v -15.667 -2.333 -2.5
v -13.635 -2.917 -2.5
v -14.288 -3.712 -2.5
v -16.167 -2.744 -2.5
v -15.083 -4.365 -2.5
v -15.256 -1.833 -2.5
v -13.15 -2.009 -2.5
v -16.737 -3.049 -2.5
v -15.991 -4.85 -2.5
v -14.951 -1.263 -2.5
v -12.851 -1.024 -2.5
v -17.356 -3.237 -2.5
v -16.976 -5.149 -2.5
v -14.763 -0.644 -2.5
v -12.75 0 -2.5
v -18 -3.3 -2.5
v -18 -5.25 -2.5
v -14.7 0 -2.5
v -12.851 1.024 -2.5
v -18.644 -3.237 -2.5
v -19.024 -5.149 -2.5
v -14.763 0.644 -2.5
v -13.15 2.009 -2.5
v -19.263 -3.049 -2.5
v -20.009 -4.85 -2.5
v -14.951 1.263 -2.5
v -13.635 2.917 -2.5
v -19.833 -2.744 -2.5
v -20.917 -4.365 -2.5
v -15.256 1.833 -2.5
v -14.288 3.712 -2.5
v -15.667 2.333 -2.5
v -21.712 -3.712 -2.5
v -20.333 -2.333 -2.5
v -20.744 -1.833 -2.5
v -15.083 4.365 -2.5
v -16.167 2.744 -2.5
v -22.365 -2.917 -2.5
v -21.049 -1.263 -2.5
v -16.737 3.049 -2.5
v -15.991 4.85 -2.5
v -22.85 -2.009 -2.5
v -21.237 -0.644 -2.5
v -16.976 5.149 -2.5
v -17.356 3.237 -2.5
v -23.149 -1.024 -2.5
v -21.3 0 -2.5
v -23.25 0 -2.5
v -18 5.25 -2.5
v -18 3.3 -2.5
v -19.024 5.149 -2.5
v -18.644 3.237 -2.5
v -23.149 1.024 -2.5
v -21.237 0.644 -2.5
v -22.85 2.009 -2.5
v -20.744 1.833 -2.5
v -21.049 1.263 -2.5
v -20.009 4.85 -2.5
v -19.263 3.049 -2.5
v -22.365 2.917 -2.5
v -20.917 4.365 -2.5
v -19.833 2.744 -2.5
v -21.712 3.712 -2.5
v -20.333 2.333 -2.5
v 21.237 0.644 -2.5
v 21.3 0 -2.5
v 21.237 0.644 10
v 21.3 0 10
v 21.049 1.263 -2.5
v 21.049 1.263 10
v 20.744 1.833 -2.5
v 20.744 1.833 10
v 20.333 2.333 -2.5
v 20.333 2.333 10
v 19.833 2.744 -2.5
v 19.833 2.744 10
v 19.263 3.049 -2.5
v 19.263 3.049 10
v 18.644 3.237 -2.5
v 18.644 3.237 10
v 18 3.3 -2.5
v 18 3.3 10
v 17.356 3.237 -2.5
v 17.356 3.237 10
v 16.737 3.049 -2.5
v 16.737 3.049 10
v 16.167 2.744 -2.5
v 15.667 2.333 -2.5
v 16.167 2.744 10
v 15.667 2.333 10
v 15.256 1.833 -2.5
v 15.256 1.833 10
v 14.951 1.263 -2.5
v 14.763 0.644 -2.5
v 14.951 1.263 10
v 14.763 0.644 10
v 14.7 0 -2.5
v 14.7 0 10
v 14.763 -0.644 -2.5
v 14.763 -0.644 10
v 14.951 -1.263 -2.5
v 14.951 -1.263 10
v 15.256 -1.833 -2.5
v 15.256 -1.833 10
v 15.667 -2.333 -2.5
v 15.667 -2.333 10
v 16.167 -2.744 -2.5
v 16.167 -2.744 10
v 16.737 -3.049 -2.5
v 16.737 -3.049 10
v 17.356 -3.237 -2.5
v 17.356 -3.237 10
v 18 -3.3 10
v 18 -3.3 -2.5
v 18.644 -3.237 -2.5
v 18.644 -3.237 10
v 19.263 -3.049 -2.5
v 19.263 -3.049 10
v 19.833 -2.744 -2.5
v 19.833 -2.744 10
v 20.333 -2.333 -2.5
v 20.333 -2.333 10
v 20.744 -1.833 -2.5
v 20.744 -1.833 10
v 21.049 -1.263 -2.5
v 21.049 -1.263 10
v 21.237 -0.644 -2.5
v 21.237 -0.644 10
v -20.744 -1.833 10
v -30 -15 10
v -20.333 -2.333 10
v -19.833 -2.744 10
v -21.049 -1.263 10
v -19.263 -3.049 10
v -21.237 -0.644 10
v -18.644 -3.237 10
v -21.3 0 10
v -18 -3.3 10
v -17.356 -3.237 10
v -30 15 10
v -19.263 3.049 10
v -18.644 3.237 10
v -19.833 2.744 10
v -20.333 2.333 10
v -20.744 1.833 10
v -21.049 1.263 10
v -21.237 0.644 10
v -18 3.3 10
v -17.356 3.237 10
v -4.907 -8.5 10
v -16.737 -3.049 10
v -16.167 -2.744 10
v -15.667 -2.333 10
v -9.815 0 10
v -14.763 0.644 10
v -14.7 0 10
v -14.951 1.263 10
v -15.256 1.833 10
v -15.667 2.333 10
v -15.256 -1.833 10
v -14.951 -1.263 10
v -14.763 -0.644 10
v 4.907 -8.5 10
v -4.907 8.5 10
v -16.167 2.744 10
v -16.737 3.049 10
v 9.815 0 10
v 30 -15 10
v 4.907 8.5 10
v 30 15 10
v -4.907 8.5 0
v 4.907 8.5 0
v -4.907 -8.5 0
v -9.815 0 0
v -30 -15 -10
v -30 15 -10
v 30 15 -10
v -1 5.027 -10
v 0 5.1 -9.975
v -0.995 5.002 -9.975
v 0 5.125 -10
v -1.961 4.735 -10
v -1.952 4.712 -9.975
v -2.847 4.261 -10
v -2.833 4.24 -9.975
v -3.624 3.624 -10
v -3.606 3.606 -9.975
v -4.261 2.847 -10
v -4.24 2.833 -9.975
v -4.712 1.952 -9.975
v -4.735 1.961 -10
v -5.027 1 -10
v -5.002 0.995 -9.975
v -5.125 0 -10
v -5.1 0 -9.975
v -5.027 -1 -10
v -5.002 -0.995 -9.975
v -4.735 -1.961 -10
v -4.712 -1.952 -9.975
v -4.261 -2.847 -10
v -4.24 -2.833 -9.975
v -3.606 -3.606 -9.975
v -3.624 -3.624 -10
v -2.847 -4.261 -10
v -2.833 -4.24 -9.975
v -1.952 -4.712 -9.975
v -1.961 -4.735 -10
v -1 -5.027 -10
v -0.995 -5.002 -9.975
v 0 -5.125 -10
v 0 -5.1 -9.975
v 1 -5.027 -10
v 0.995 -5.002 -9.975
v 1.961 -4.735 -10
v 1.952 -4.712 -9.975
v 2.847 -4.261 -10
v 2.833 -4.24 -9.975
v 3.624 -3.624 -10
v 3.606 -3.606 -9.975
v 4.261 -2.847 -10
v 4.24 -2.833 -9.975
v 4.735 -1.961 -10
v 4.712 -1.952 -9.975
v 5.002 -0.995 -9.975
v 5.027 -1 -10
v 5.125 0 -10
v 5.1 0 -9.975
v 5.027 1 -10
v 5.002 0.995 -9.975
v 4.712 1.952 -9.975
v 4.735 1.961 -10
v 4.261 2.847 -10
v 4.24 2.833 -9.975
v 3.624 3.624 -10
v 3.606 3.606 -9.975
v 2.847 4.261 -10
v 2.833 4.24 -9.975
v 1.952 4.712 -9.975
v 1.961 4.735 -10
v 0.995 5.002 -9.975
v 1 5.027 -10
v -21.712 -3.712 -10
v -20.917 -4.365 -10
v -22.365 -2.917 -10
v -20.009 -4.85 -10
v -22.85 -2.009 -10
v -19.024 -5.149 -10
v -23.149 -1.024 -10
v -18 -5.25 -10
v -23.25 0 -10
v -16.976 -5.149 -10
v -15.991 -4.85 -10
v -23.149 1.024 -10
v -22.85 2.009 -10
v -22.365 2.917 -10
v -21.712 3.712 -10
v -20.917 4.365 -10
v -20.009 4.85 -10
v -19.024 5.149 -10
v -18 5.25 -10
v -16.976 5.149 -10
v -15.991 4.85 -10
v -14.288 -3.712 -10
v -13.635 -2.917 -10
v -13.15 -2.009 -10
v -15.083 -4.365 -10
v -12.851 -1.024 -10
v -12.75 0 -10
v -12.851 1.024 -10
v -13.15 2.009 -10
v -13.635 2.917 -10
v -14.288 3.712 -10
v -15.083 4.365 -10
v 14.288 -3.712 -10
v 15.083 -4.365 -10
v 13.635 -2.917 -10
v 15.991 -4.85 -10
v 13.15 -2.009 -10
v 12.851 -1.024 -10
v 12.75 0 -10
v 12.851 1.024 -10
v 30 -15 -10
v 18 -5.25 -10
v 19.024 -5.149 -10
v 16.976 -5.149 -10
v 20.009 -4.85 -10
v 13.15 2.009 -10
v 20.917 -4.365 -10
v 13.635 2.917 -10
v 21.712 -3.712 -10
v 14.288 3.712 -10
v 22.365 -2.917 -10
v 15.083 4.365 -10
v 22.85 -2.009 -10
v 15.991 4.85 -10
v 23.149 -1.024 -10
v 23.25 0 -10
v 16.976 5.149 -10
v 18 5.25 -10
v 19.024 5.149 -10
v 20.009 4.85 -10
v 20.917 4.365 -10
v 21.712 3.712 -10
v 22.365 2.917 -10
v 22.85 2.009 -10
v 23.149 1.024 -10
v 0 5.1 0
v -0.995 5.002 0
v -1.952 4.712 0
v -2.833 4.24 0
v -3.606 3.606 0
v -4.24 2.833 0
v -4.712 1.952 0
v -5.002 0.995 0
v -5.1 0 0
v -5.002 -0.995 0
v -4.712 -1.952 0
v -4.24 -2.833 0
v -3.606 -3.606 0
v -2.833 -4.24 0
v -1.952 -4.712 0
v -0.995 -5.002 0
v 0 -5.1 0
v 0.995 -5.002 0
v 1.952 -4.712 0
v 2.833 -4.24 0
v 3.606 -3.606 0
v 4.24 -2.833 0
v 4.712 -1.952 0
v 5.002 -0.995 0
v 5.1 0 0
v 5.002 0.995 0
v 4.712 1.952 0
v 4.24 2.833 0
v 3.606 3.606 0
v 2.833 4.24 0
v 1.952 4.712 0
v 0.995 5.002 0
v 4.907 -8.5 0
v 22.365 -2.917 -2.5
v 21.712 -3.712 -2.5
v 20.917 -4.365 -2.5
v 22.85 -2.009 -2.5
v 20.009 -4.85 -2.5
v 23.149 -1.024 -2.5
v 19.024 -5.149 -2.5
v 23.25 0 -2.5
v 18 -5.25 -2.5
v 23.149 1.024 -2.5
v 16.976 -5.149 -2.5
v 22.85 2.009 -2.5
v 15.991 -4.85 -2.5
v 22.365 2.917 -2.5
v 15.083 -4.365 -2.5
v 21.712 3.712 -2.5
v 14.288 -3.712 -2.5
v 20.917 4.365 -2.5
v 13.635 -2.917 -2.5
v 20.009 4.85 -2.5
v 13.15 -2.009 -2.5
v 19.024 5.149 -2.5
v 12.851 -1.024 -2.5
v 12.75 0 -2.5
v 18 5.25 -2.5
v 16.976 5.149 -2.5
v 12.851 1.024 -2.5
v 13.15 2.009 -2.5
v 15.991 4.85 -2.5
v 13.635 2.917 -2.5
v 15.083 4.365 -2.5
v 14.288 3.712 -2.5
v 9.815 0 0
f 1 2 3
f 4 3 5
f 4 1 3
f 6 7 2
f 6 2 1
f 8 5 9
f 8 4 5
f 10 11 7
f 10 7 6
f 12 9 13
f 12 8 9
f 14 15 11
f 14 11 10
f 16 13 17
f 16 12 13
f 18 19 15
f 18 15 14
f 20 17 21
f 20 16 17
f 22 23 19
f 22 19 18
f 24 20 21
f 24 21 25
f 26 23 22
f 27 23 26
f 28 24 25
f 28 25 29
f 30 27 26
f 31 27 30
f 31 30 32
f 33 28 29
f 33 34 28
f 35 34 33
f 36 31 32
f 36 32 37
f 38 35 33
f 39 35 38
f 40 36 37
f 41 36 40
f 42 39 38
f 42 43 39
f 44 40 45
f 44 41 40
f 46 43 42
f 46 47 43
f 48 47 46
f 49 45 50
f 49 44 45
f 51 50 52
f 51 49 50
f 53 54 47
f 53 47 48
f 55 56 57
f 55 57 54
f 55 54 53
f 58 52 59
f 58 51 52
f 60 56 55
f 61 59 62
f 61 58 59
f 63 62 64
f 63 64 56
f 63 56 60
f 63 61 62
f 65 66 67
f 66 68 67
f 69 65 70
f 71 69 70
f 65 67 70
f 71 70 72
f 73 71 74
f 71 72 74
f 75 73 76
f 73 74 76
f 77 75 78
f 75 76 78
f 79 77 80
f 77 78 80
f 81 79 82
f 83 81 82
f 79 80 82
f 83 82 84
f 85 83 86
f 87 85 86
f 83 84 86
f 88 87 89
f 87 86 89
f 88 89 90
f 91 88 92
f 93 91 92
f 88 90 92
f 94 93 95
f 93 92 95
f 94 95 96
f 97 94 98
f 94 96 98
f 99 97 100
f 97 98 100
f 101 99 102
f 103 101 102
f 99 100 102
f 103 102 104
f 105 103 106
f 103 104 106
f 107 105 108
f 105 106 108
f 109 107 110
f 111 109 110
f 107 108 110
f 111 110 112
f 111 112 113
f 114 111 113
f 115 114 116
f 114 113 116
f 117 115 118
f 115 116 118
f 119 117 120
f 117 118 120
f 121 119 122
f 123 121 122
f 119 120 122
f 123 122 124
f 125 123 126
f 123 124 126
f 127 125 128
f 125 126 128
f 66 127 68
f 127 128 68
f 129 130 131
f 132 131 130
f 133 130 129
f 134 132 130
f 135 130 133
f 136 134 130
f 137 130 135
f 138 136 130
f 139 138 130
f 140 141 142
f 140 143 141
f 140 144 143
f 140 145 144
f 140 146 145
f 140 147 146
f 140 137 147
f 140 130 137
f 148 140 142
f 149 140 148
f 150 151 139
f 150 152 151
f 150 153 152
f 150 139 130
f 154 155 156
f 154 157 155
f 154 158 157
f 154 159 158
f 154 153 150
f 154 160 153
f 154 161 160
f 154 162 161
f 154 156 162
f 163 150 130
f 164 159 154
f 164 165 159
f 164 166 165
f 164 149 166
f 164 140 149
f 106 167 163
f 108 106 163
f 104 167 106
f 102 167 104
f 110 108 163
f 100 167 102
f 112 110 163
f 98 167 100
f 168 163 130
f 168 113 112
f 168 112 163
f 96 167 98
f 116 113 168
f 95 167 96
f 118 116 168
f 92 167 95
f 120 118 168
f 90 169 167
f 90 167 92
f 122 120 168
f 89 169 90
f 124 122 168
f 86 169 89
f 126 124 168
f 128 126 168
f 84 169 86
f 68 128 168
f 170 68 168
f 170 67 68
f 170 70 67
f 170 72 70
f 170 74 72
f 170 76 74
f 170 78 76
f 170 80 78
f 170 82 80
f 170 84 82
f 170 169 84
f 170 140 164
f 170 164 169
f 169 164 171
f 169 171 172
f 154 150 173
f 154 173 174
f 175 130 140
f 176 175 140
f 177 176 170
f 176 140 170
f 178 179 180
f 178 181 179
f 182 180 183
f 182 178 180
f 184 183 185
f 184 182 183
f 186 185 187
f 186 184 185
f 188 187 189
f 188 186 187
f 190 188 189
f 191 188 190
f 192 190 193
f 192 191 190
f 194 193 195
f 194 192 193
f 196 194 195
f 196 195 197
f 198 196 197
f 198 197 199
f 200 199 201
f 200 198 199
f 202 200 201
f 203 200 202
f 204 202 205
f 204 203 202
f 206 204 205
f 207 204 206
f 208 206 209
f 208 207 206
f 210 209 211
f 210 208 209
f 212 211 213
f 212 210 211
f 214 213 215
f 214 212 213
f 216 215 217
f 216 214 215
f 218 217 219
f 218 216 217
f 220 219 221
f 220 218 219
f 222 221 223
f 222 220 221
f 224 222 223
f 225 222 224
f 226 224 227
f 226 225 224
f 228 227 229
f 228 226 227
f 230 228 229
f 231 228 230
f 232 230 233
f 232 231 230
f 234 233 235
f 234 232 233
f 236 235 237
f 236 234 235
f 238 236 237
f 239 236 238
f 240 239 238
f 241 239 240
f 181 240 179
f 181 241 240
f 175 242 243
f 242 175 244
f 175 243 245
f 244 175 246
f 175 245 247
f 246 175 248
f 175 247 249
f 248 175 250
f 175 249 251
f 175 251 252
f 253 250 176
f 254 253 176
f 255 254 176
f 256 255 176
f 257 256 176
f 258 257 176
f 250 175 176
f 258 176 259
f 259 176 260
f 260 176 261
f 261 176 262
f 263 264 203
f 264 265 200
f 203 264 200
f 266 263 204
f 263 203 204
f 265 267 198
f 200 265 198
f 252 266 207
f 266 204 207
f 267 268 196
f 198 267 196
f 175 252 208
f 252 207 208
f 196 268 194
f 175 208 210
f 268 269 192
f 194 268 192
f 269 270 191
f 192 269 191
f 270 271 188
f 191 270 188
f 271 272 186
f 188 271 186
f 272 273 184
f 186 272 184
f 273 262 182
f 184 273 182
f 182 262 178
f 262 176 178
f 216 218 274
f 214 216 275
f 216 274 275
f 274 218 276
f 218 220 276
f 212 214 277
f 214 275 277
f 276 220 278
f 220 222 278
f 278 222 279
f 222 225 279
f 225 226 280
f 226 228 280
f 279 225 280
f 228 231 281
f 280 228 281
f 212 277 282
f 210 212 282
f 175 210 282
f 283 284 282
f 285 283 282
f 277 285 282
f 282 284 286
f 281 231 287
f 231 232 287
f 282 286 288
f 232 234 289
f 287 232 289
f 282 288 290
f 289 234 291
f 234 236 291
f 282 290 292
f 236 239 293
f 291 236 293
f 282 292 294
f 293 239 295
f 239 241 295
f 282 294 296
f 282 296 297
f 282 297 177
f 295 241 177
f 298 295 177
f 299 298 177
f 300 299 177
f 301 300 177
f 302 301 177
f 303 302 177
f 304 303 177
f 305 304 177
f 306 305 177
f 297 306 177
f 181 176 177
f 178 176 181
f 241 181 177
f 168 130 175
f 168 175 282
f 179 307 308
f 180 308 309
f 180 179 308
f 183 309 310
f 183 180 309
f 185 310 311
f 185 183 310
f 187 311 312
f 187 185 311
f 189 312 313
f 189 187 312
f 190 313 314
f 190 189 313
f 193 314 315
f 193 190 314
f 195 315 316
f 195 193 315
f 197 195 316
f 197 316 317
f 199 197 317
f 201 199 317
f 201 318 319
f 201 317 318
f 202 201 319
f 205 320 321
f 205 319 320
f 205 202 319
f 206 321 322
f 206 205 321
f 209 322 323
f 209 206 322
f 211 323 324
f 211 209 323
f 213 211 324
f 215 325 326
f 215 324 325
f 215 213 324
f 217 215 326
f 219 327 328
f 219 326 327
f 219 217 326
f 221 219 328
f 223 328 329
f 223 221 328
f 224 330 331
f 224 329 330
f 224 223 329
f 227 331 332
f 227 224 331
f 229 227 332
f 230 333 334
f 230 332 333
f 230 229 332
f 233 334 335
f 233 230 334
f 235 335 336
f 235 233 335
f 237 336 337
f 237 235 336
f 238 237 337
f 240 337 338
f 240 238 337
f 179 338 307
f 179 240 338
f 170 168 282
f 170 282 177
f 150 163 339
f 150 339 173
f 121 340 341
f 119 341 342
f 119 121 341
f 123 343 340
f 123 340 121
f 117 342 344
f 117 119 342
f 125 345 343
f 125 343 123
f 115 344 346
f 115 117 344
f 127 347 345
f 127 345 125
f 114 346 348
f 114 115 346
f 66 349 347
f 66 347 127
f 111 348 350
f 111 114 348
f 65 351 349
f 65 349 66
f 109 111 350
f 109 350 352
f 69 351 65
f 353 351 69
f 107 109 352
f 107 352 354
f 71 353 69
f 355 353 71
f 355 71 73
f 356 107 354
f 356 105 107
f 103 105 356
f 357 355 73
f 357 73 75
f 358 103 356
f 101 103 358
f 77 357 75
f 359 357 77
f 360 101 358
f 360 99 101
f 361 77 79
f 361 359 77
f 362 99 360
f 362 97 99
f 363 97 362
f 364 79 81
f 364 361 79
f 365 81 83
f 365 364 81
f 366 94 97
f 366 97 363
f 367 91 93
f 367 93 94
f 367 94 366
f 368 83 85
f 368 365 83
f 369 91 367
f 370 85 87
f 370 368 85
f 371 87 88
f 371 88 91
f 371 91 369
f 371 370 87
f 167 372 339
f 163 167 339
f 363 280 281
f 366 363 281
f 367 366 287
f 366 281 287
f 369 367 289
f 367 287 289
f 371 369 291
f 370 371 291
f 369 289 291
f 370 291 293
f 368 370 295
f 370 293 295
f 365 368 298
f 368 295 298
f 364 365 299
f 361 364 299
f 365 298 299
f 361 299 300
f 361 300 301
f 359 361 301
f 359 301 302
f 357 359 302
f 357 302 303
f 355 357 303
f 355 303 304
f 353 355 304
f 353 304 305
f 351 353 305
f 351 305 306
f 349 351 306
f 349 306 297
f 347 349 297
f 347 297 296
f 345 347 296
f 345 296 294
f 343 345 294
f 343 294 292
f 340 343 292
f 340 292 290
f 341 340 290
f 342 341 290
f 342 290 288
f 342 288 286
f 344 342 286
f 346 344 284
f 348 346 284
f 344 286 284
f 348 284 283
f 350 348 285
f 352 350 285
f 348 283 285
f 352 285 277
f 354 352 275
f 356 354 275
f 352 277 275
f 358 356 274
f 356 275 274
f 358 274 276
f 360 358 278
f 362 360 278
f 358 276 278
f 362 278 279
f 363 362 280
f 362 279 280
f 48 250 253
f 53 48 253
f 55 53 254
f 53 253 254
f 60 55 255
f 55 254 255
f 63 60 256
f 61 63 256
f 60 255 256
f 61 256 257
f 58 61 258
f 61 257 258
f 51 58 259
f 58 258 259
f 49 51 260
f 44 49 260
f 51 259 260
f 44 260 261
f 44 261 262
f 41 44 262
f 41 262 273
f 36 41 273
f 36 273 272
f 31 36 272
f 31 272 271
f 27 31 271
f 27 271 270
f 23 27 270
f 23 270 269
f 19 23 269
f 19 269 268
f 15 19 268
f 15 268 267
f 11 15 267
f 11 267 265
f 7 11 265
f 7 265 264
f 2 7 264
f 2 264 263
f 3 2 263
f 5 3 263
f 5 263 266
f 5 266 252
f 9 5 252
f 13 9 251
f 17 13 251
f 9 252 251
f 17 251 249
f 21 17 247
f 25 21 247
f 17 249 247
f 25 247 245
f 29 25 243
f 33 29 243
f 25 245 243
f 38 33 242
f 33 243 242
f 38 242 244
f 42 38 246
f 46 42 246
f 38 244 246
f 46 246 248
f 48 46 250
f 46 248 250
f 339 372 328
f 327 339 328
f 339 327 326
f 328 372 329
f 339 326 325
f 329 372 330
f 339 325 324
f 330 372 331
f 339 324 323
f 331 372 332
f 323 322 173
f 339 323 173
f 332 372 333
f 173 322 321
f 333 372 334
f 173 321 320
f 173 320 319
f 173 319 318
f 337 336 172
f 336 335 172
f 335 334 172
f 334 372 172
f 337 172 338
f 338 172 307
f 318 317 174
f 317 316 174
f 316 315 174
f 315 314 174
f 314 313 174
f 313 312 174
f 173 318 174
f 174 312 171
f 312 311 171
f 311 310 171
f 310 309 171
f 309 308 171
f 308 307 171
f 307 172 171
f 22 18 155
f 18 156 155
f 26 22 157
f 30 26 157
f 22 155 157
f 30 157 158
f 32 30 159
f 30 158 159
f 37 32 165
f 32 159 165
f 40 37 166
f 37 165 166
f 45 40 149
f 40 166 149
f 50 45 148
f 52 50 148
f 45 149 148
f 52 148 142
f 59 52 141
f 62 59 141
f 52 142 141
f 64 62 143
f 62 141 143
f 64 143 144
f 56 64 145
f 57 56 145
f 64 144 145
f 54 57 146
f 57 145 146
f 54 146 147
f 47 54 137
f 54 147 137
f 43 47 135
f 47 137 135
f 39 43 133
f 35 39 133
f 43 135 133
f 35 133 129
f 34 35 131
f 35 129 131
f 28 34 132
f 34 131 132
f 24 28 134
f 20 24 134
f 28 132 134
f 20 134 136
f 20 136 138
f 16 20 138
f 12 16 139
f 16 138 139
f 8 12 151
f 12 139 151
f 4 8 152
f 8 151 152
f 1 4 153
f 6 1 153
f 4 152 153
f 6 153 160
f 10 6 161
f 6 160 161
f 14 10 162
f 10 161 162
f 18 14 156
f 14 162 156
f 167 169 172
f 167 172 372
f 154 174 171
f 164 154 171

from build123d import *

# Parameters (mm, degrees)
SKETCH3_W                                    = 60
SKETCH3_H                                    = 30
BOSS_EXTRUDE1_DEPTH                          = 10
CBORE_FOR_M6_HEX_HEAD_CAP_SCREW1_D           = 6.6
CBORE_FOR_M6_HEX_HEAD_CAP_SCREW1_CBORE_D     = 10.5
CBORE_FOR_M6_HEX_HEAD_CAP_SCREW1_CBORE_DEPTH = 7.5
CUT_EXTRUDE1_DEPTH                           = 10


with BuildPart() as part:
    # Sketch3 → Boss-Extrude1 (new, symmetric)
    with BuildSketch(Plane.XY):
        Rectangle(SKETCH3_W, SKETCH3_H)
    extrude(amount=BOSS_EXTRUDE1_DEPTH, both=True)

    # CBORE for M6 Hex Head Cap Screw1 (through all)
    with Locations(Plane(origin=(0, 0, -10), x_dir=(-1, 0, 0), z_dir=(0, 0, -1))):
        with Locations((18, 0), (-18, 0)):
            CounterBoreHole(CBORE_FOR_M6_HEX_HEAD_CAP_SCREW1_D / 2, CBORE_FOR_M6_HEX_HEAD_CAP_SCREW1_CBORE_D / 2, CBORE_FOR_M6_HEX_HEAD_CAP_SCREW1_CBORE_DEPTH)

    # Sketch9 → Tap Drill for M12 Tap1 (revolve, cut)
    with BuildSketch(Plane(origin=(0, 0, -10), x_dir=(0, 1, 0), z_dir=(1, 0, 0))):
        Polygon((0, 0), (0, 20), (5.125, 20), (5.1, 19.975), (5.1, 0.025), (5.125, 0), align=None)
    revolve(axis=Axis((0, 0, -16.35), (0, 0, 1)), mode=Mode.SUBTRACT)

    # Sketch11 → Cut-Extrude1 (cut)
    with BuildSketch(Plane(origin=(0, 0, 10), x_dir=(-1, 0, 0), z_dir=(0, 0, -1))):
        Polygon((4.907477288, 8.5), (-4.907477288, 8.5), (-9.814954576, 0), (-4.907477288, -8.5), (4.907477288, -8.5), (9.814954576, 0), align=None)
    extrude(amount=CUT_EXTRUDE1_DEPTH, mode=Mode.SUBTRACT)


solid = part.part
